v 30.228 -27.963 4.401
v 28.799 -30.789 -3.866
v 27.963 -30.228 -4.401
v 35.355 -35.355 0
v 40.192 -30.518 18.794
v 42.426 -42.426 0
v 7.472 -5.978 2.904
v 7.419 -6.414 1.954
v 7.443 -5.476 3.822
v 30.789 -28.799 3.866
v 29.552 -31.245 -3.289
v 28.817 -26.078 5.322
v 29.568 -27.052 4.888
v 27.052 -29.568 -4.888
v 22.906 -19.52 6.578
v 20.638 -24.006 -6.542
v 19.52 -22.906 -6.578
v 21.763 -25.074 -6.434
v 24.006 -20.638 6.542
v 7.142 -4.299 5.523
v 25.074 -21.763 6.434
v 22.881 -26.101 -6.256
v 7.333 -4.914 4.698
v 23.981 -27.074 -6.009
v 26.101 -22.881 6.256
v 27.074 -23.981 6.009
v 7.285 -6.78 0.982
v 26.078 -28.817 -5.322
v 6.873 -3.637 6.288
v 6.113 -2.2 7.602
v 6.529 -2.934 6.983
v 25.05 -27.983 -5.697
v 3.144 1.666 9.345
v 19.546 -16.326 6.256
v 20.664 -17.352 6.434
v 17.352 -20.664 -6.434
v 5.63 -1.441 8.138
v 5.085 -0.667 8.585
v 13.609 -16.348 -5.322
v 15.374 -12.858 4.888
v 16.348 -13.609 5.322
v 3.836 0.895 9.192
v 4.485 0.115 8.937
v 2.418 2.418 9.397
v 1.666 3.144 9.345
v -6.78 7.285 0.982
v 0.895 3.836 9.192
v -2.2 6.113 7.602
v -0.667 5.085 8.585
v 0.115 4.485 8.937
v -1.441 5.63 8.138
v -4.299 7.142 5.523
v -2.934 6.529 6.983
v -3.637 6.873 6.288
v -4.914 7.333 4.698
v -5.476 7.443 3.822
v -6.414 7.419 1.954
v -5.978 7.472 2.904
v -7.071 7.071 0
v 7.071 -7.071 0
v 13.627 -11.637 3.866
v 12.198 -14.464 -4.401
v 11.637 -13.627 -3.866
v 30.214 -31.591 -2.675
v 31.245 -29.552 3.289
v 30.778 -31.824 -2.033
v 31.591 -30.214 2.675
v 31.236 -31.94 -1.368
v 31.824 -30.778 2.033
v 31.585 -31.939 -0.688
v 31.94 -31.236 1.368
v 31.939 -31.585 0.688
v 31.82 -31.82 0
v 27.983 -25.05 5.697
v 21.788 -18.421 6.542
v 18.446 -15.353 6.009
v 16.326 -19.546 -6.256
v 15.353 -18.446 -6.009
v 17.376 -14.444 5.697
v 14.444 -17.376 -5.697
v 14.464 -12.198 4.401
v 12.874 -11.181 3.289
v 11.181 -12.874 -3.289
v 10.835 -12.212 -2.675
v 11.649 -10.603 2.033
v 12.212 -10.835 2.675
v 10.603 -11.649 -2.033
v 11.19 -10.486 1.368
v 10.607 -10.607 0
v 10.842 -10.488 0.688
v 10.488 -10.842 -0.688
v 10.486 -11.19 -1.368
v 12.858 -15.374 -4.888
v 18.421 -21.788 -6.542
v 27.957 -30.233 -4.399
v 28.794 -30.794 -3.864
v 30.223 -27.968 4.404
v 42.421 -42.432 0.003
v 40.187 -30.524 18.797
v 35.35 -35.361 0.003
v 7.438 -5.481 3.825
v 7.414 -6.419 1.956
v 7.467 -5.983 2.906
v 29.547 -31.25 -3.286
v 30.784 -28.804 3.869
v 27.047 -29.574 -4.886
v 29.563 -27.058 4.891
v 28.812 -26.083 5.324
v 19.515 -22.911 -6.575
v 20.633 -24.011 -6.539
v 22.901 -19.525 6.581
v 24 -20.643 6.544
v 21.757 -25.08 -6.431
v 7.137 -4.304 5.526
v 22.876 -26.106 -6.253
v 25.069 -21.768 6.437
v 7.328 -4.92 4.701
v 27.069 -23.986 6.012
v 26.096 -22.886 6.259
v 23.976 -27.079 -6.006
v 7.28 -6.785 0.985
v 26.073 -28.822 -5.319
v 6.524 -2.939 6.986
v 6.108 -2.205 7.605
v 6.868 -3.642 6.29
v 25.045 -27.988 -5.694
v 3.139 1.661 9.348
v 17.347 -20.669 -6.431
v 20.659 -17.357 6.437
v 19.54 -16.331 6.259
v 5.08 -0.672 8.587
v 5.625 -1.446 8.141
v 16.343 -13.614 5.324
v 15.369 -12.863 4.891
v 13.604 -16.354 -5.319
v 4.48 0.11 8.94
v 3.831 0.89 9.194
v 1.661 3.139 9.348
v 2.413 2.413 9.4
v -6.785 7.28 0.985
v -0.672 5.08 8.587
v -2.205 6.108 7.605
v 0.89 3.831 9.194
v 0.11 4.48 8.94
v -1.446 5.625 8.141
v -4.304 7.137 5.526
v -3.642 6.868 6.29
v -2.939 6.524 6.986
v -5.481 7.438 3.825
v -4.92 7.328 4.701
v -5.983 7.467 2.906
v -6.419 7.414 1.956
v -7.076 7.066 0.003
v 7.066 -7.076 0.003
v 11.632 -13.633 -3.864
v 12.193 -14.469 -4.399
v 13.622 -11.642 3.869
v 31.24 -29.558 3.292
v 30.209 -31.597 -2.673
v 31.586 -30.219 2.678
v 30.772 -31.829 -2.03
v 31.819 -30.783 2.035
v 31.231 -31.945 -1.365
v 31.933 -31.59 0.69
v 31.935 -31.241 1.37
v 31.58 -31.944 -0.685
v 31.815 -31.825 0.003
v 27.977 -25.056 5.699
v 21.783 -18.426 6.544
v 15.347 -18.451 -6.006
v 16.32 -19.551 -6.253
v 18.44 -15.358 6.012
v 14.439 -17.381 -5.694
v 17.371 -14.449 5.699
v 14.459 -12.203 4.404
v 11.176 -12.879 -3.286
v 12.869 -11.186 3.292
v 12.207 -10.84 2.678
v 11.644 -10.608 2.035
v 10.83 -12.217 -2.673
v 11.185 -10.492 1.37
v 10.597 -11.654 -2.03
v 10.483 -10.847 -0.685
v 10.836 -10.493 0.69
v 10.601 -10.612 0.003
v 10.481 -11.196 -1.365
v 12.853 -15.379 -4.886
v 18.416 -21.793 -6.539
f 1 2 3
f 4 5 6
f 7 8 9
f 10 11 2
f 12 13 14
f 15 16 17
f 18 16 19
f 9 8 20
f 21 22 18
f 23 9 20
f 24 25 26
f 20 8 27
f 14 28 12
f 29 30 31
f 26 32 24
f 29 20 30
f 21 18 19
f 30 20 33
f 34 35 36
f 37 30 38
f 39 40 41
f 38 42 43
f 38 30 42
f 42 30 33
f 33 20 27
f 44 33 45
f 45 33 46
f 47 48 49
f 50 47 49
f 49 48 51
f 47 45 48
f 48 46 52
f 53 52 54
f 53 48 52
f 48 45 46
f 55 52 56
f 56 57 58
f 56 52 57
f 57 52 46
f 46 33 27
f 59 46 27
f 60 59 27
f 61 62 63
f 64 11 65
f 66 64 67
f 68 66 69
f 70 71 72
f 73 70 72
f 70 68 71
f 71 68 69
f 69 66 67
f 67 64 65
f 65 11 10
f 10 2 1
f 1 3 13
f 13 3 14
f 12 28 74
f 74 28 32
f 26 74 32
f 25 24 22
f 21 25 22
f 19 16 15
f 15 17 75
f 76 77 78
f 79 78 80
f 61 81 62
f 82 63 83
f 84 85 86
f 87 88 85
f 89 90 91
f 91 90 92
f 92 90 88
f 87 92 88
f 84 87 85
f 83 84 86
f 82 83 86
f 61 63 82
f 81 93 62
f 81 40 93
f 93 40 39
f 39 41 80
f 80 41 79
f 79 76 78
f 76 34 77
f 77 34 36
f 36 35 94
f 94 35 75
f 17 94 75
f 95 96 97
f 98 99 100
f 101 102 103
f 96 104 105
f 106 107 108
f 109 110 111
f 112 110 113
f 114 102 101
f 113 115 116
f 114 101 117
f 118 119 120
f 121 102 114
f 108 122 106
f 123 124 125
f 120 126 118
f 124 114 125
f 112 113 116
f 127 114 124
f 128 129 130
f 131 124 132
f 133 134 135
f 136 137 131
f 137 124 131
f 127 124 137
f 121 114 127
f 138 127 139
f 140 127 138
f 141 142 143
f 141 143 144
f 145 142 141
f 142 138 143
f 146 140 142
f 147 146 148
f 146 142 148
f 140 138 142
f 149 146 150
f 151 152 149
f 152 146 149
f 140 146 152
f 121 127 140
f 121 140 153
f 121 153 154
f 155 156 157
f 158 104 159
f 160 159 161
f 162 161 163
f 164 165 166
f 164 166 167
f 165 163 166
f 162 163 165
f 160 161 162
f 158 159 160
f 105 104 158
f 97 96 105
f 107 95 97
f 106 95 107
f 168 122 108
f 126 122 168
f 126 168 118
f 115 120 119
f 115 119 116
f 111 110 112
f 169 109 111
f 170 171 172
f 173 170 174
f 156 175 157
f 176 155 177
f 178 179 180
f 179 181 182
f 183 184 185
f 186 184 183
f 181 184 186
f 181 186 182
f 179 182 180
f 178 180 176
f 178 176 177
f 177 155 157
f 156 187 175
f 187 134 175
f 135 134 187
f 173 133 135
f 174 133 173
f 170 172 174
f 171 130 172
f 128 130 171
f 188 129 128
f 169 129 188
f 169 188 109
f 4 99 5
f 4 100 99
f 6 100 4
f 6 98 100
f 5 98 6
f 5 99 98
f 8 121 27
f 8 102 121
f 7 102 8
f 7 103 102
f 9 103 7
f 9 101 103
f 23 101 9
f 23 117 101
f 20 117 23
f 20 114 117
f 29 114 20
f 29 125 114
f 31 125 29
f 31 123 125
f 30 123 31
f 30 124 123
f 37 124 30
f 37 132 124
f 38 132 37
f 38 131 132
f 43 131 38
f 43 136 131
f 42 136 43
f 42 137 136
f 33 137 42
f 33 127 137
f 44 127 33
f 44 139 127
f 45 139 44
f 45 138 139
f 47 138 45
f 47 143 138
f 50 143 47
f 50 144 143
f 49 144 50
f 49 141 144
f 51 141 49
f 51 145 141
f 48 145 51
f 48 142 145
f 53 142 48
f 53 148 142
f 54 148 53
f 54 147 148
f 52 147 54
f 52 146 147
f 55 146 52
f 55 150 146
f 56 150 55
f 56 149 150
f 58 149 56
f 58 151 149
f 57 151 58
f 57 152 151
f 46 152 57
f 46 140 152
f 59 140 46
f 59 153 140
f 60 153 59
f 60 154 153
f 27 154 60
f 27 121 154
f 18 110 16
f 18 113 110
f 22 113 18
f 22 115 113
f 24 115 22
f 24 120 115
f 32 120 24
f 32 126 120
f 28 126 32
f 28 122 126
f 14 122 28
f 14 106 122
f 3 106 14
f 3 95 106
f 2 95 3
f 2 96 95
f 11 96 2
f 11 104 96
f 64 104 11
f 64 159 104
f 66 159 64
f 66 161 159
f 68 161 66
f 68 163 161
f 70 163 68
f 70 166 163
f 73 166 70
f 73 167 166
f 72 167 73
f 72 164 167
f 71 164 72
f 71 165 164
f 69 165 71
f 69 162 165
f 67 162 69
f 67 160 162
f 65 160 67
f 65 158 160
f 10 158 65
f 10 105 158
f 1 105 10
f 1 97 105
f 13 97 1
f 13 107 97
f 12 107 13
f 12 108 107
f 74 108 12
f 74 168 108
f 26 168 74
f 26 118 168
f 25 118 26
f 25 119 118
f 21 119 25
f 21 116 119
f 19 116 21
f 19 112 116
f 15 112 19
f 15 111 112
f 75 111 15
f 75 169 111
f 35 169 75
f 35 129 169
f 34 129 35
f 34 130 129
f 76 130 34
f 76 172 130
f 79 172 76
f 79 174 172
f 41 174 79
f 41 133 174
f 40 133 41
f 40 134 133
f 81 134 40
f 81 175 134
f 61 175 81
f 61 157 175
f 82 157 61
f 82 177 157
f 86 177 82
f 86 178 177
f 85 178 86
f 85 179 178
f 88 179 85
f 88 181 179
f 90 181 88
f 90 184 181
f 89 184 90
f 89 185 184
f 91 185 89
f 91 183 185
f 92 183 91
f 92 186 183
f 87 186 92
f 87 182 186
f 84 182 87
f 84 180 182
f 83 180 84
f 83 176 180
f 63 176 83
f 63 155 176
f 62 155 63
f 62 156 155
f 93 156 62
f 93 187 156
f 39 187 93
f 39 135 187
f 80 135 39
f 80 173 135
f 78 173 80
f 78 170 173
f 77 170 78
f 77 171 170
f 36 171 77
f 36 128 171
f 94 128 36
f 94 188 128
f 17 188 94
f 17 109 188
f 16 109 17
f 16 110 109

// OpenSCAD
// file: ../utils/core/clip.scad
//
// NopSCADlib Copyright Chris Palmer 2018
// nop.head@gmail.com
// hydraraptor.blogspot.com
//
// This file is part of NopSCADlib.
//
// NopSCADlib is free software: you can redistribute it and/or modify it under the terms of the
// GNU General Public License as published by the Free Software Foundation, either version 3 of
// the License, or (at your option) any later version.
//
// NopSCADlib is distributed in the hope that it will be useful, but WITHOUT ANY WARRANTY;
// without even the implied warranty of MERCHANTABILITY or FITNESS FOR A PARTICULAR PURPOSE.
// See the GNU General Public License for more details.
//
// You should have received a copy of the GNU General Public License along with NopSCADlib.
// If not, see <https://www.gnu.org/licenses/>.
//

//
//! Construct arbirarily large box to partition 3D space and clip objects, useful for creating cross sections to see the inside when debugging.
//!
//! Original version by Doug Moen on the OpenSCAD forum
//
//
module box(xmin, ymin, zmin, xmax, ymax, zmax) //! Construct a box given its bounds
    polyhedron(
        [[xmin, ymin, zmin],  // 0
         [xmin, ymin, zmax],  // 1
         [xmin, ymax, zmin],  // 2
         [xmin, ymax, zmax],  // 3
         [xmax, ymin, zmin],  // 4
         [xmax, ymin, zmax],  // 5
         [xmax, ymax, zmin],  // 6
         [xmax, ymax, zmax]], // 7
        [[7,5,1,3],  // top
         [2,0,4,6],  // bottom
         [5,4,0,1],  // front
         [3,2,6,7],  // back
         [5,7,6,4],  // right
         [0,2,3,1]]  // left
    );

module clip(xmin = -inf, ymin = -inf, zmin = -inf, xmax = inf, ymax = inf, zmax = inf) //! Clip child to specified boundaries
    render() intersection() {
        children();

        box(xmin, ymin, zmin, xmax, ymax, zmax);
    }
// file: ../utils/core/rounded_rectangle.scad
//
// NopSCADlib Copyright Chris Palmer 2018
// nop.head@gmail.com
// hydraraptor.blogspot.com
//
// This file is part of NopSCADlib.
//
// NopSCADlib is free software: you can redistribute it and/or modify it under the terms of the
// GNU General Public License as published by the Free Software Foundation, either version 3 of
// the License, or (at your option) any later version.
//
// NopSCADlib is distributed in the hope that it will be useful, but WITHOUT ANY WARRANTY;
// without even the implied warranty of MERCHANTABILITY or FITNESS FOR A PARTICULAR PURPOSE.
// See the GNU General Public License for more details.
//
// You should have received a copy of the GNU General Public License along with NopSCADlib.
// If not, see <https://www.gnu.org/licenses/>.
//

//
//! Rectangle with rounded corners.
//
module rounded_square(size, r, center = true) //! Like ```square()``` but with with rounded corners
{
    $fn = r2sides4n(r);
    offset(r) offset(-r) square(size, center = center);
}

module rounded_rectangle(size, r, center = true, xy_center = true) //! Like ```cube()``` but corners rounded in XY plane and separate centre options for xy and z.
{
    linear_extrude(height = size[2], center = center)
        rounded_square([size[0], size[1]], r, xy_center);
}
// file: ../utils/core/teardrops.scad
//
// NopSCADlib Copyright Chris Palmer 2018
// nop.head@gmail.com
// hydraraptor.blogspot.com
//
// This file is part of NopSCADlib.
//
// NopSCADlib is free software: you can redistribute it and/or modify it under the terms of the
// GNU General Public License as published by the Free Software Foundation, either version 3 of
// the License, or (at your option) any later version.
//
// NopSCADlib is distributed in the hope that it will be useful, but WITHOUT ANY WARRANTY;
// without even the implied warranty of MERCHANTABILITY or FITNESS FOR A PARTICULAR PURPOSE.
// See the GNU General Public License for more details.
//
// You should have received a copy of the GNU General Public License along with NopSCADlib.
// If not, see <https://www.gnu.org/licenses/>.
//

//
//! For making horizontal holes that don't need support material.
//! Small holes can get away without it, but they print better with truncated teardrops.
//
module teardrop(h, r, center = true, truncate = true, chamfer = 0) { //! For making horizontal holes that don't need support material, set ```truncate = false``` to make traditional RepRap teardrops that don't even need bridging
    module teardrop_2d(r, truncate) {
        hull() {
            circle4n(r);
            if(truncate)
                translate([0, r / 2])
                    square([2 * r * (sqrt(2) - 1), r], center = true);
            else
                polygon([[0, 0], [eps, 0], [0, r * sqrt(2)]]);
        }
    }

    render(convexity = 5)
        extrude_if(h, center)
            teardrop_2d(r, truncate);

    teardrop_chamfer(h, center, chamfer) {
        linear_extrude(eps, center = true)
            teardrop_2d(r + chamfer / 2, truncate);
        translate_z(-chamfer / 2)
            linear_extrude(eps, center = true)
                teardrop_2d(r, truncate);
    }
}

module semi_teardrop(h, r, d = undef, center = true, chamfer = 0) { //! A semi teardrop in the positive Y domain
    module semi_teardrop_2d(r, d) {
        intersection() {
            R = is_undef(d) ? r : d / 2;
            teardrop(r = R, h = 0);

            sq = R + 1;
            translate([-sq, 0])
                square([2 * sq, sq]);
        }
    }

    render(convexity = 5)
        extrude_if(h, center)
            semi_teardrop_2d(r, d);

    teardrop_chamfer(h, center, chamfer) {
        linear_extrude(eps, center = true)
            semi_teardrop_2d(r + chamfer / 2, d);
        translate_z(-chamfer / 2)
            linear_extrude(eps, center = true)
                semi_teardrop_2d(r, d);
    }
}

module teardrop_plus(h, r, center = true, truncate = true, chamfer = 0) //! Slightly bigger teardrop to allow for the 3D printing staircase effect
    teardrop(h, r + layer_height / 4, center, truncate, chamfer);

module tearslot(h, r, w, center = true, chamfer = 0) { //! A horizontal slot that doesn't need support material
    module tearslot_2d(r, w) {
        hull() {
            translate([-w / 2, 0]) teardrop(r = r, h = 0);
            translate([w / 2, 0]) teardrop(r = r, h = 0);
        }
    }

    extrude_if(h, center)
        tearslot_2d(r, w);

    teardrop_chamfer(h, center, chamfer) {
        linear_extrude(eps, center = true)
            tearslot_2d(r + chamfer / 2, w);
        translate_z(-chamfer / 2)
            linear_extrude(eps, center = true)
                tearslot_2d(r, w);
    }
}

module vertical_tearslot(h, r, l, center = true, chamfer = 0) { //! A vertical slot that doesn't need support material
    module vertical_tearslot_2d(r, l) {
        hull() {
            translate([0,  l / 2]) teardrop(0, r, true);
            translate([0, -l / 2]) circle4n(r);
        }
    }

    extrude_if(h, center)
        vertical_tearslot_2d(r, l);

    teardrop_chamfer(h, center, chamfer) {
        linear_extrude(eps, center = true)
            vertical_tearslot_2d(r + chamfer / 2, l);
        translate_z(-chamfer / 2)
            linear_extrude(eps, center = true)
                vertical_tearslot_2d(r, l);
    }
}

module teardrop_chamfer(h, center, chamfer) { //! Helper module for adding chamfer to a teardrop
    if(h && chamfer)
        translate_z(center ? 0 : h / 2)
            for(m = [0, 1])
                mirror([0, 0, m])
                    translate_z((h - eps ) / 2)
                        hull()
                            children();
}
// file: ../utils/core/polyholes.scad
//
// NopSCADlib Copyright Chris Palmer 2018
// nop.head@gmail.com
// hydraraptor.blogspot.com
//
// This file is part of NopSCADlib.
//
// NopSCADlib is free software: you can redistribute it and/or modify it under the terms of the
// GNU General Public License as published by the Free Software Foundation, either version 3 of
// the License, or (at your option) any later version.
//
// NopSCADlib is distributed in the hope that it will be useful, but WITHOUT ANY WARRANTY;
// without even the implied warranty of MERCHANTABILITY or FITNESS FOR A PARTICULAR PURPOSE.
// See the GNU General Public License for more details.
//
// You should have received a copy of the GNU General Public License along with NopSCADlib.
// If not, see <https://www.gnu.org/licenses/>.
//

//
//! A method of making 3D printed holes come out the right size regardless of the printer, providing
//! it gets the linear dimensions right. See <https://hydraraptor.blogspot.com/2011/02/polyholes.html>
//!
//! The module provides `poly_circle()`, `poly_cylinder()` and `poly_ring()` that is useful for making printed washers and pillars.
//
function sides(r) = max(round(4 * r), 3);                                       //! Optimium number of sides for specified radius
function corrected_radius(r, n = 0)   = r / cos(180 / (n ? n : sides(r)));      //! Adjusted radius to make flats lie on the circle
function corrected_diameter(d, n = 0) = d / cos(180 / (n ? n : sides(d / 2)));  //! Adjusted diameter to make flats lie on the circle

module poly_circle(r, sides = 0) { //! Make a circle adjusted to print the correct size
    n = sides ? sides : sides(r);
    circle(r = corrected_radius(r,n), $fn = n);
}

module poly_cylinder(r, h, center = false, sides = 0) //! Make a cylinder adjusted to print the correct size
    extrude_if(h, center)
        poly_circle(r, sides);

module poly_ring(or, ir) { //! Make a 2D ring adjusted to have the correct internal radius
    cir = corrected_radius(ir);
    filaments = (or - cir) / extrusion_width;
    if(filaments > 3 + eps)
        difference() {
            circle(or);

            poly_circle(ir);
        }
    else
        if(filaments >= 2)
            difference() {
                offset(or - cir)
                    poly_circle(ir);

                poly_circle(ir);
            }
            else
                difference() {
                    poly_circle(or);

                    offset(-squeezed_wall)
                        poly_circle(or);
                }
}

module poly_tube(or, ir, h, center = false) //! Make a tube adjusted to have the correct internal radius
    extrude_if(h, center)
        poly_ring(or, ir);

module drill(r, h = 100) //! Make a cylinder for drilling holes suitable for CNC routing, set h = 0 for circle
    extrude_if(h)
        circle(r = corrected_radius(r, r2sides(r)));
//
// Horizontal slot
//
module slot(r, l, h = 100) //! Make a horizontal slot suitable for CNC routing, set h = 0 for 2D version
    extrude_if(h)
        hull() {
            translate([l / 2,0])
                drill(r, 0);

            translate([-l / 2,0])
                drill(r, 0);
        }
// file: ../utils/core/bom.scad
//
// NopSCADlib Copyright Chris Palmer 2018
// nop.head@gmail.com
// hydraraptor.blogspot.com
//
// This file is part of NopSCADlib.
//
// NopSCADlib is free software: you can redistribute it and/or modify it under the terms of the
// GNU General Public License as published by the Free Software Foundation, either version 3 of
// the License, or (at your option) any later version.
//
// NopSCADlib is distributed in the hope that it will be useful, but WITHOUT ANY WARRANTY;
// without even the implied warranty of MERCHANTABILITY or FITNESS FOR A PARTICULAR PURPOSE.
// See the GNU General Public License for more details.
//
// You should have received a copy of the GNU General Public License along with NopSCADlib.
// If not, see <https://www.gnu.org/licenses/>.
//

//
//! Bill Of Materials generation via echo and the ```bom.py``` script. Also handles exploded assembly views and posing. Assembly instructions can precede the module
//! definition that makes the assembly.
//!
//! The example below shows how to define a vitamin and incorporate it into an assembly with sub-assemblies and make an exploded view. The resulting flat BOM is shown but
//! heirachical BOMs are also generated for real projects.
//
function bom_mode(n = 1) = $_bom >= n && (is_undef($on_bom) || $on_bom);  //! Current BOM mode, 0 = none, 1 = printed and routed parts and assemblies, 2 includes vitamins as well
function exploded() = is_undef($exploded_parent) ? $exploded : 0;   //! Returns the value of ```$exploded``` if it is defined, else ```0```
function show_supports() = !$preview || exploded();                 //! True if printed support material should be shown

module no_explode() let($exploded_parent = true) children();        //! Prevent children being exploded
module no_pose() let($posed = true) children();                     //! Force children not to be posed even if parent is

module explode(d, explode_children = false, offset = [0,0,0]) {     //! Explode children by specified Z distance or vector ```d```, option to explode grand children
    v = is_list(d) ? d : [0, 0, d];
    o = is_list(offset) ? offset : [0, 0, offset];
    if($exploded && is_undef($exploded_parent) && norm(v)) {
        translate(o)                                                // Draw the line first in case the child is transparent
            color("yellow") hull() {
                sphere(0.2);

                translate(v * $exploded)
                    sphere(0.2);
            }

        translate(v * $exploded)
            let($exploded_parent = explode_children ? undef : true)
                children();
    }
    else
        children();
}

module pose(a = [55, 0, 25], t = [0, 0, 0], exploded = undef)       //! Pose an STL or assembly for rendering to png by specifying rotation ```a``` and translation ```t```, ```exploded = true for``` just the exploded view or ```false``` for unexploded only.
    if(is_undef($pose) || !is_undef($posed) || (!is_undef(exploded) && exploded != !!exploded()))
        children();
    else
        let($posed = true) // only pose the top level
            rotate([55, 0, 25])
                rotate([-a.x, 0, 0])
                    rotate([0, -a.y, 0])
                        rotate([0, 0, -a.z])
                            translate(-t)
                                children();

module pose_hflip(exploded = undef)       //! Pose an STL or assembly for rendering to png by flipping around the Y axis, ```exploded = true for``` just the exploded view or ```false``` for unexploded only.
    if(is_undef($pose) || !is_undef($posed) || (!is_undef(exploded) && exploded != !!exploded()))
        children();
    else
        let($posed = true) // only pose the top level
            hflip()
                children();

module pose_vflip(exploded = undef)       //! Pose an STL or assembly for rendering to png by flipping around the X axis, ```exploded = true for``` just the exploded view or ```false``` for unexploded only.
    if(is_undef($pose) || !is_undef($posed) || (!is_undef(exploded) && exploded != !!exploded()))
        children();
    else
        let($posed = true) // only pose the top level
            vflip()
                children();


module assembly(name) {                 //! Name an assembly that will appear on the BOM, there needs to a module named ```<name>_assembly``` to make it
    if(bom_mode())
        echo(str("~", name, "_assembly{"));

    no_pose()
        if(is_undef($child_assembly))
            let($child_assembly = true)
                children();
        else
            no_explode()
                children();

    if(bom_mode())
        echo(str("~}", name, "_assembly"));
}

module stl(name) {                      //! Name an stl that will appear on the BOM, there needs to a module named ```<name>_stl``` to make it
    if(bom_mode())
        echo(str("~", name, ".stl"));
}

module dxf(name) {                      //! Name a dxf that will appear on the BOM, there needs to a module named ```<name>_dxf``` to make it
    if(bom_mode())
        echo(str("~", name, ".dxf"));
}

function value_string(value) = is_string(value) ? str("\"", value, "\"") : str(value); //! Convert ```value``` to a string or quote it if it is already a string

function arg(value, default, name = "") =   //! Create string for arg if not default, helper for ```vitamin()```
    value == default ? ""
                     : name ? str(", ", name, " = ", value_string(value))
                            : str(", ", value_string(value));

module vitamin(description) {                //! Describe a vitamin for the BOM entry and precede it with a module call that creates it, eg. "wigit(42): Type 42 widget"
    if(bom_mode(2))
        echo(str("~", description, !is_undef($hidden) ? " - not shown" : ""));
}

module not_on_bom(on = false)               //! Specify the following child parts are not on the BOM, for example when they are on a PCB that comes assembled
    let($on_bom = on)
        children();

module hidden()                             //! Make item invisible, except on the BOM
    scale(1 / sqr(1024))
        let($hidden = true)
            children();
// file: ../utils/core/sphere.scad
//
// NopSCADlib Copyright Chris Palmer 2018
// nop.head@gmail.com
// hydraraptor.blogspot.com
//
// This file is part of NopSCADlib.
//
// NopSCADlib is free software: you can redistribute it and/or modify it under the terms of the
// GNU General Public License as published by the Free Software Foundation, either version 3 of
// the License, or (at your option) any later version.
//
// NopSCADlib is distributed in the hope that it will be useful, but WITHOUT ANY WARRANTY;
// without even the implied warranty of MERCHANTABILITY or FITNESS FOR A PARTICULAR PURPOSE.
// See the GNU General Public License for more details.
//
// You should have received a copy of the GNU General Public License along with NopSCADlib.
// If not, see <https://www.gnu.org/licenses/>.
//

//! Redefines `sphere()` to always have a vertex on all six half axes I.e. vertices at the poles and the equator and `$fn` a multiple of four.
//! This ensures `hull` and `minkowski` results have the correct dimensions when spheres are placed at the corners.

module sphere(r = 1, d = undef) {                   //! Override ```sphere``` so that has vertices on all three axes. Has the advantage of giving correct dimensions when hulled
    R = is_undef(d) ? r : d / 2;
    rotate_extrude($fn = r2sides4n(R))
        rotate(-90)
            semi_circle(R);
}
// file: ../utils/core/global.scad
//
// NopSCADlib Copyright Chris Palmer 2018
// nop.head@gmail.com
// hydraraptor.blogspot.com
//
// This file is part of NopSCADlib.
//
// NopSCADlib is free software: you can redistribute it and/or modify it under the terms of the
// GNU General Public License as published by the Free Software Foundation, either version 3 of
// the License, or (at your option) any later version.
//
// NopSCADlib is distributed in the hope that it will be useful, but WITHOUT ANY WARRANTY;
// without even the implied warranty of MERCHANTABILITY or FITNESS FOR A PARTICULAR PURPOSE.
// See the GNU General Public License for more details.
//
// You should have received a copy of the GNU General Public License along with NopSCADlib.
// If not, see <https://www.gnu.org/licenses/>.
//

//
//! Global constants, functions and modules. This file is used directly or indirectly in every scad file.
//
include <../../global_defs.scad>

function inch(x) = x * 25.4;                                                        //! Inch to mm conversion (For fractional inches, 'inch(1 + 7/8)' will work as expected.)
function foot(x) = x * 25.4 * 12;                                                   //! Foot to mm conversion
function yard(x) = x * 25.4 * 12 * 3;                                               //! Yard to mm conversion
function mm(x)   = x;                                                               //! Explicit mm specified
function cm(x)   = x * 10.0;                                                        //! cm to mm conversion
function m(x)    = x * 1000.0;                                                      //! m to mm conversion

function sqr(x) = x * x;                                                            //! Returns the square of ```x```
function echoit(x) = echo(x) x;                                                     //! Echo expression and return it, useful for debugging
function in(list, x) = !!len([for(v = list) if(v == x) true]);                      //! Returns true if ```x``` is an element in the ```list```
function Len(x) = is_list(x) ? len(x) : 0;                                          //! Returns the length of a list or 0 if ```x``` is not a list
function r2sides(r) = $fn ? $fn : ceil(max(min(360/ $fa, r * 2 * PI / $fs), 5));    //! Replicates the OpenSCAD logic to calculate the number of sides from the radius
function r2sides4n(r) = floor((r2sides(r) + 3) / 4) * 4;                            //! Round up the number of sides to a multiple of 4 to ensure points land on all axes

module translate_z(z) translate([0, 0, z]) children();                              //! Shortcut for Z only translations
module vflip() rotate([180, 0, 0]) children();                                      //! Invert children by doing a 180&deg; flip around the X axis
module hflip() rotate([0, 180, 0]) children();                                      //! Invert children by doing a 180&deg; flip around the Y axis
module ellipse(xr, yr) scale([1, yr / xr]) circle4n(xr);                            //! Draw an ellipse

module extrude_if(h, center = true)                 //! Extrudes 2D object to 3D when ```h``` is nonzero, otherwise leaves it 2D
    if(h)
        linear_extrude(height = h, center = center, convexity = 2) // 3D
            children();
    else
        children();                                 // 2D

module circle4n(r, d = undef) {                     //! Circle with multiple of 4 vertices
    R = is_undef(d) ? r : d / 2;
    circle(R, $fn = r2sides4n(R));
}

module semi_circle(r, d = undef)                    //! A semi circle in the positive Y domain
    intersection() {
        R = is_undef(d) ? r : d / 2;
        circle4n(R);

        sq = R + 1;
        translate([-sq, 0])
            square([2 * sq, sq]);
    }

module right_triangle(width, height, h, center = true) //! A right angled triangle with the 90&deg; corner at the origin. 3D when ```h``` is nonzero, otherwise 2D
    extrude_if(h, center = center)
        polygon(points = [[0,0], [width, 0], [0, height]]);

include <sphere.scad>
include <bom.scad>
include <polyholes.scad>
include <teardrops.scad>
include <rounded_rectangle.scad>
include <clip.scad>
// file: ../global_defs.scad
//
// NopSCADlib Copyright Chris Palmer 2018
// nop.head@gmail.com
// hydraraptor.blogspot.com
//
// This file is part of NopSCADlib.
//
// NopSCADlib is free software: you can redistribute it and/or modify it under the terms of the
// GNU General Public License as published by the Free Software Foundation, either version 3 of
// the License, or (at your option) any later version.
//
// NopSCADlib is distributed in the hope that it will be useful, but WITHOUT ANY WARRANTY;
// without even the implied warranty of MERCHANTABILITY or FITNESS FOR A PARTICULAR PURPOSE.
// See the GNU General Public License for more details.
//
// You should have received a copy of the GNU General Public License along with NopSCADlib.
// If not, see <https://www.gnu.org/licenses/>.
//

//
// This file included directly or indirectly in every scad file.
//
// This scheme allows the following:
//  bom defaults to 0
//  Setting $bom on the command line or in the main file before including lib.scad overrides it everywhere.
//  Setting $bom after including lib overrides bom in the libs but not in the local file.
//  Setting $_bom in the local file overrides it in the local file but not in the libs.
//
//function is_undef(x) = x == undef;

$_bom           = is_undef($bom)             ? 0      : $bom;             // 0 no bom, 1 assemblies and stls, 2 vitamins as well
$exploded       = is_undef($explode)         ? 0      : $explode;         // 1 for exploded view
layer_height    = is_undef($layer_height)    ? 0.25   : $layer_height;    // layer heigth when printing
extrusion_width = is_undef($extrusion_width) ? 0.5    : $extrusion_width; // filament width when printing
nozzle          = is_undef($nozzle)          ? 0.45   : $nozzle;          // 3D printer nozzle
cnc_bit_r       = is_undef($cnc_bit_r)       ? 1.2    : $cnc_bit_r;       // miniumum tool radius when milling 2D objects
pp1_colour      = is_undef($pp1_colour)      ? [0, 146/255, 0] : $pp1_colour; // printed part colour 1, RepRap logo colour
pp2_colour      = is_undef($pp2_colour)      ? "red"  : $pp2_colour;      // printed part colour 2
pp3_colour      = is_undef($pp3_colour)      ? "blue" : $pp3_colour;      // printed part colour 3
pp4_colour      = is_undef($pp4_colour)      ? "darkorange" : $pp4_colour;// printed part colour 4
show_rays       = is_undef($show_rays)       ? false  : $show_rays;       // show camera sight lines and light direction
show_threads    = is_undef($show_threads)    ? false  : $show_threads;    // show screw threads

// Minimum wall is about two filaments wide but we extrude it closer to get better bonding
squeezed_wall = $preview ? 2 * extrusion_width - layer_height * (1 - PI / 4)
                         : extrusion_width - layer_height / 2 + nozzle / 2 + extrusion_width / 2;

inf = 1e10;      // very big
eps = 1/128;     // small fudge factor to stop CSG barfing on coincident faces.
$fa = 6;
$fs = extrusion_width / 2;

function round_to_layer(z) = ceil(z / layer_height) * layer_height;
// Some additional named colors
grey20                          = [0.2, 0.2, 0.2];
grey30                          = [0.3, 0.3, 0.3];
grey40                          = [0.4, 0.4, 0.4];
grey50                          = [0.5, 0.5, 0.5];
grey60                          = [0.6, 0.6, 0.6];
grey70                          = [0.7, 0.7, 0.7];
grey80                          = [0.8, 0.8, 0.8];
grey90                          = [0.9, 0.9, 0.9];
gold                            = [255/255, 215/255, 0/255];
brass                           = [255/255, 220/255, 100/255];
silver                          = [0.75, 0.75, 0.75];

/*
 * Enums
 */
//
// Screws
//
hs_cap    = 0;
hs_pan    = 1;
hs_cs     = 2;     // counter sunk
hs_hex    = 3;
hs_grub   = 4;     // pulley set screw
hs_cs_cap = 5;
hs_dome   = 6;
//
// Hot end descriptions
//
jhead   = 1;
e3d     = 2;
//
// Face enumeration
//
f_bottom = 0;
f_top    = 1;
f_left   = 2;
f_right  = 3;
f_front  = 4;
f_back   = 5;
// file: ../utils/core/core.scad
//
// NopSCADlib Copyright Chris Palmer 2018
// nop.head@gmail.com
// hydraraptor.blogspot.com
//
// This file is part of NopSCADlib.
//
// NopSCADlib is free software: you can redistribute it and/or modify it under the terms of the
// GNU General Public License as published by the Free Software Foundation, either version 3 of
// the License, or (at your option) any later version.
//
// NopSCADlib is distributed in the hope that it will be useful, but WITHOUT ANY WARRANTY;
// without even the implied warranty of MERCHANTABILITY or FITNESS FOR A PARTICULAR PURPOSE.
// See the GNU General Public License for more details.
//
// You should have received a copy of the GNU General Public License along with NopSCADlib.
// If not, see <https://www.gnu.org/licenses/>.
//

//
// Include this file to use the miniumum library
//
include <../../global_defs.scad>
//
// Global functions and modules
//
use <global.scad>

module use_stl(name) {               //! Import an STL to make a build platter
    stl(name);

    import(str("../stls/", name, ".stl"));
}

module use_dxf(name) {               //! Import a DXF to make a build panel
    dxf(name);

    import(str("../dxfs/", name, ".dxf"));
}
// main file
//
// NopSCADlib Copyright Chris Palmer 2018
// nop.head@gmail.com
// hydraraptor.blogspot.com
//
// This file is part of NopSCADlib.
//
// NopSCADlib is free software: you can redistribute it and/or modify it under the terms of the
// GNU General Public License as published by the Free Software Foundation, either version 3 of
// the License, or (at your option) any later version.
//
// NopSCADlib is distributed in the hope that it will be useful, but WITHOUT ANY WARRANTY;
// without even the implied warranty of MERCHANTABILITY or FITNESS FOR A PARTICULAR PURPOSE.
// See the GNU General Public License for more details.
//
// You should have received a copy of the GNU General Public License along with NopSCADlib.
// If not, see <https://www.gnu.org/licenses/>.
//

include <../utils/core/core.scad>

module globals() {
    linear_extrude(height = eps) {
        semi_circle(r = 10);

        translate([30, 0])
            ellipse(15, 7);

        translate([50, 0])
            right_triangle(10, 20, 0);
    }
}

rotate([70, 0, 315]) globals();
